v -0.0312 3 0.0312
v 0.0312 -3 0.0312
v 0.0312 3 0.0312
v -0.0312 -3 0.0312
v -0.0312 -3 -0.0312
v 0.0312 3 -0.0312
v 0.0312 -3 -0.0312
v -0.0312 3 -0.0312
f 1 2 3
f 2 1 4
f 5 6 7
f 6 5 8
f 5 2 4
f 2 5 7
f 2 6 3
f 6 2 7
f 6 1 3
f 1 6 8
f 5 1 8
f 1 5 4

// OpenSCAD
// square_spar

module square_spar(length=6,size=1/16) {
	cube([size,length,size], center=true);
}

square_spar(6,1/16);
